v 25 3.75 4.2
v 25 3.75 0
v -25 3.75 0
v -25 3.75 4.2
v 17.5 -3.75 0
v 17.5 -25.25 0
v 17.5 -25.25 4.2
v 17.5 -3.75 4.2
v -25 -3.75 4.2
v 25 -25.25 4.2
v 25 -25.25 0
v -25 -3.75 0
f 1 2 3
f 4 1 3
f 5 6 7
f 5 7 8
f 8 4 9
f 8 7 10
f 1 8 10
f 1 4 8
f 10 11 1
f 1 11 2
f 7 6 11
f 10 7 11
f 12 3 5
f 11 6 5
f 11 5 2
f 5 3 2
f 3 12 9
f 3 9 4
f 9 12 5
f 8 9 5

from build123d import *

# Parameters (mm, degrees)
F0_W     = 42.5
F0_H     = 7.5
F0_W_2   = 7.5
F0_H_2   = 21.5
F1_DEPTH = 4.2
F2_DEPTH = 4.2


with BuildPart() as f1:
    # F0 (on Top) → F1 (new body)
    with BuildSketch(Plane.XY):
        with Locations((-3.75, 0)):
            Rectangle(F0_W, F0_H)
        with Locations((21.25, 0)):
            Rectangle(F0_W_2, F0_H)
        with Locations((21.25, -14.5)):
            Rectangle(F0_W_2, F0_H_2)
    extrude(amount=F1_DEPTH)

    # F0 (on Top) → F2 (join)
    with BuildSketch(Plane.XY):
        with Locations((-3.75, 0)):
            Rectangle(F0_W, F0_H)
        with Locations((21.25, 0)):
            Rectangle(F0_W_2, F0_H)
        with Locations((21.25, -14.5)):
            Rectangle(F0_W_2, F0_H_2)
    extrude(amount=F2_DEPTH)


solid = f1.part
